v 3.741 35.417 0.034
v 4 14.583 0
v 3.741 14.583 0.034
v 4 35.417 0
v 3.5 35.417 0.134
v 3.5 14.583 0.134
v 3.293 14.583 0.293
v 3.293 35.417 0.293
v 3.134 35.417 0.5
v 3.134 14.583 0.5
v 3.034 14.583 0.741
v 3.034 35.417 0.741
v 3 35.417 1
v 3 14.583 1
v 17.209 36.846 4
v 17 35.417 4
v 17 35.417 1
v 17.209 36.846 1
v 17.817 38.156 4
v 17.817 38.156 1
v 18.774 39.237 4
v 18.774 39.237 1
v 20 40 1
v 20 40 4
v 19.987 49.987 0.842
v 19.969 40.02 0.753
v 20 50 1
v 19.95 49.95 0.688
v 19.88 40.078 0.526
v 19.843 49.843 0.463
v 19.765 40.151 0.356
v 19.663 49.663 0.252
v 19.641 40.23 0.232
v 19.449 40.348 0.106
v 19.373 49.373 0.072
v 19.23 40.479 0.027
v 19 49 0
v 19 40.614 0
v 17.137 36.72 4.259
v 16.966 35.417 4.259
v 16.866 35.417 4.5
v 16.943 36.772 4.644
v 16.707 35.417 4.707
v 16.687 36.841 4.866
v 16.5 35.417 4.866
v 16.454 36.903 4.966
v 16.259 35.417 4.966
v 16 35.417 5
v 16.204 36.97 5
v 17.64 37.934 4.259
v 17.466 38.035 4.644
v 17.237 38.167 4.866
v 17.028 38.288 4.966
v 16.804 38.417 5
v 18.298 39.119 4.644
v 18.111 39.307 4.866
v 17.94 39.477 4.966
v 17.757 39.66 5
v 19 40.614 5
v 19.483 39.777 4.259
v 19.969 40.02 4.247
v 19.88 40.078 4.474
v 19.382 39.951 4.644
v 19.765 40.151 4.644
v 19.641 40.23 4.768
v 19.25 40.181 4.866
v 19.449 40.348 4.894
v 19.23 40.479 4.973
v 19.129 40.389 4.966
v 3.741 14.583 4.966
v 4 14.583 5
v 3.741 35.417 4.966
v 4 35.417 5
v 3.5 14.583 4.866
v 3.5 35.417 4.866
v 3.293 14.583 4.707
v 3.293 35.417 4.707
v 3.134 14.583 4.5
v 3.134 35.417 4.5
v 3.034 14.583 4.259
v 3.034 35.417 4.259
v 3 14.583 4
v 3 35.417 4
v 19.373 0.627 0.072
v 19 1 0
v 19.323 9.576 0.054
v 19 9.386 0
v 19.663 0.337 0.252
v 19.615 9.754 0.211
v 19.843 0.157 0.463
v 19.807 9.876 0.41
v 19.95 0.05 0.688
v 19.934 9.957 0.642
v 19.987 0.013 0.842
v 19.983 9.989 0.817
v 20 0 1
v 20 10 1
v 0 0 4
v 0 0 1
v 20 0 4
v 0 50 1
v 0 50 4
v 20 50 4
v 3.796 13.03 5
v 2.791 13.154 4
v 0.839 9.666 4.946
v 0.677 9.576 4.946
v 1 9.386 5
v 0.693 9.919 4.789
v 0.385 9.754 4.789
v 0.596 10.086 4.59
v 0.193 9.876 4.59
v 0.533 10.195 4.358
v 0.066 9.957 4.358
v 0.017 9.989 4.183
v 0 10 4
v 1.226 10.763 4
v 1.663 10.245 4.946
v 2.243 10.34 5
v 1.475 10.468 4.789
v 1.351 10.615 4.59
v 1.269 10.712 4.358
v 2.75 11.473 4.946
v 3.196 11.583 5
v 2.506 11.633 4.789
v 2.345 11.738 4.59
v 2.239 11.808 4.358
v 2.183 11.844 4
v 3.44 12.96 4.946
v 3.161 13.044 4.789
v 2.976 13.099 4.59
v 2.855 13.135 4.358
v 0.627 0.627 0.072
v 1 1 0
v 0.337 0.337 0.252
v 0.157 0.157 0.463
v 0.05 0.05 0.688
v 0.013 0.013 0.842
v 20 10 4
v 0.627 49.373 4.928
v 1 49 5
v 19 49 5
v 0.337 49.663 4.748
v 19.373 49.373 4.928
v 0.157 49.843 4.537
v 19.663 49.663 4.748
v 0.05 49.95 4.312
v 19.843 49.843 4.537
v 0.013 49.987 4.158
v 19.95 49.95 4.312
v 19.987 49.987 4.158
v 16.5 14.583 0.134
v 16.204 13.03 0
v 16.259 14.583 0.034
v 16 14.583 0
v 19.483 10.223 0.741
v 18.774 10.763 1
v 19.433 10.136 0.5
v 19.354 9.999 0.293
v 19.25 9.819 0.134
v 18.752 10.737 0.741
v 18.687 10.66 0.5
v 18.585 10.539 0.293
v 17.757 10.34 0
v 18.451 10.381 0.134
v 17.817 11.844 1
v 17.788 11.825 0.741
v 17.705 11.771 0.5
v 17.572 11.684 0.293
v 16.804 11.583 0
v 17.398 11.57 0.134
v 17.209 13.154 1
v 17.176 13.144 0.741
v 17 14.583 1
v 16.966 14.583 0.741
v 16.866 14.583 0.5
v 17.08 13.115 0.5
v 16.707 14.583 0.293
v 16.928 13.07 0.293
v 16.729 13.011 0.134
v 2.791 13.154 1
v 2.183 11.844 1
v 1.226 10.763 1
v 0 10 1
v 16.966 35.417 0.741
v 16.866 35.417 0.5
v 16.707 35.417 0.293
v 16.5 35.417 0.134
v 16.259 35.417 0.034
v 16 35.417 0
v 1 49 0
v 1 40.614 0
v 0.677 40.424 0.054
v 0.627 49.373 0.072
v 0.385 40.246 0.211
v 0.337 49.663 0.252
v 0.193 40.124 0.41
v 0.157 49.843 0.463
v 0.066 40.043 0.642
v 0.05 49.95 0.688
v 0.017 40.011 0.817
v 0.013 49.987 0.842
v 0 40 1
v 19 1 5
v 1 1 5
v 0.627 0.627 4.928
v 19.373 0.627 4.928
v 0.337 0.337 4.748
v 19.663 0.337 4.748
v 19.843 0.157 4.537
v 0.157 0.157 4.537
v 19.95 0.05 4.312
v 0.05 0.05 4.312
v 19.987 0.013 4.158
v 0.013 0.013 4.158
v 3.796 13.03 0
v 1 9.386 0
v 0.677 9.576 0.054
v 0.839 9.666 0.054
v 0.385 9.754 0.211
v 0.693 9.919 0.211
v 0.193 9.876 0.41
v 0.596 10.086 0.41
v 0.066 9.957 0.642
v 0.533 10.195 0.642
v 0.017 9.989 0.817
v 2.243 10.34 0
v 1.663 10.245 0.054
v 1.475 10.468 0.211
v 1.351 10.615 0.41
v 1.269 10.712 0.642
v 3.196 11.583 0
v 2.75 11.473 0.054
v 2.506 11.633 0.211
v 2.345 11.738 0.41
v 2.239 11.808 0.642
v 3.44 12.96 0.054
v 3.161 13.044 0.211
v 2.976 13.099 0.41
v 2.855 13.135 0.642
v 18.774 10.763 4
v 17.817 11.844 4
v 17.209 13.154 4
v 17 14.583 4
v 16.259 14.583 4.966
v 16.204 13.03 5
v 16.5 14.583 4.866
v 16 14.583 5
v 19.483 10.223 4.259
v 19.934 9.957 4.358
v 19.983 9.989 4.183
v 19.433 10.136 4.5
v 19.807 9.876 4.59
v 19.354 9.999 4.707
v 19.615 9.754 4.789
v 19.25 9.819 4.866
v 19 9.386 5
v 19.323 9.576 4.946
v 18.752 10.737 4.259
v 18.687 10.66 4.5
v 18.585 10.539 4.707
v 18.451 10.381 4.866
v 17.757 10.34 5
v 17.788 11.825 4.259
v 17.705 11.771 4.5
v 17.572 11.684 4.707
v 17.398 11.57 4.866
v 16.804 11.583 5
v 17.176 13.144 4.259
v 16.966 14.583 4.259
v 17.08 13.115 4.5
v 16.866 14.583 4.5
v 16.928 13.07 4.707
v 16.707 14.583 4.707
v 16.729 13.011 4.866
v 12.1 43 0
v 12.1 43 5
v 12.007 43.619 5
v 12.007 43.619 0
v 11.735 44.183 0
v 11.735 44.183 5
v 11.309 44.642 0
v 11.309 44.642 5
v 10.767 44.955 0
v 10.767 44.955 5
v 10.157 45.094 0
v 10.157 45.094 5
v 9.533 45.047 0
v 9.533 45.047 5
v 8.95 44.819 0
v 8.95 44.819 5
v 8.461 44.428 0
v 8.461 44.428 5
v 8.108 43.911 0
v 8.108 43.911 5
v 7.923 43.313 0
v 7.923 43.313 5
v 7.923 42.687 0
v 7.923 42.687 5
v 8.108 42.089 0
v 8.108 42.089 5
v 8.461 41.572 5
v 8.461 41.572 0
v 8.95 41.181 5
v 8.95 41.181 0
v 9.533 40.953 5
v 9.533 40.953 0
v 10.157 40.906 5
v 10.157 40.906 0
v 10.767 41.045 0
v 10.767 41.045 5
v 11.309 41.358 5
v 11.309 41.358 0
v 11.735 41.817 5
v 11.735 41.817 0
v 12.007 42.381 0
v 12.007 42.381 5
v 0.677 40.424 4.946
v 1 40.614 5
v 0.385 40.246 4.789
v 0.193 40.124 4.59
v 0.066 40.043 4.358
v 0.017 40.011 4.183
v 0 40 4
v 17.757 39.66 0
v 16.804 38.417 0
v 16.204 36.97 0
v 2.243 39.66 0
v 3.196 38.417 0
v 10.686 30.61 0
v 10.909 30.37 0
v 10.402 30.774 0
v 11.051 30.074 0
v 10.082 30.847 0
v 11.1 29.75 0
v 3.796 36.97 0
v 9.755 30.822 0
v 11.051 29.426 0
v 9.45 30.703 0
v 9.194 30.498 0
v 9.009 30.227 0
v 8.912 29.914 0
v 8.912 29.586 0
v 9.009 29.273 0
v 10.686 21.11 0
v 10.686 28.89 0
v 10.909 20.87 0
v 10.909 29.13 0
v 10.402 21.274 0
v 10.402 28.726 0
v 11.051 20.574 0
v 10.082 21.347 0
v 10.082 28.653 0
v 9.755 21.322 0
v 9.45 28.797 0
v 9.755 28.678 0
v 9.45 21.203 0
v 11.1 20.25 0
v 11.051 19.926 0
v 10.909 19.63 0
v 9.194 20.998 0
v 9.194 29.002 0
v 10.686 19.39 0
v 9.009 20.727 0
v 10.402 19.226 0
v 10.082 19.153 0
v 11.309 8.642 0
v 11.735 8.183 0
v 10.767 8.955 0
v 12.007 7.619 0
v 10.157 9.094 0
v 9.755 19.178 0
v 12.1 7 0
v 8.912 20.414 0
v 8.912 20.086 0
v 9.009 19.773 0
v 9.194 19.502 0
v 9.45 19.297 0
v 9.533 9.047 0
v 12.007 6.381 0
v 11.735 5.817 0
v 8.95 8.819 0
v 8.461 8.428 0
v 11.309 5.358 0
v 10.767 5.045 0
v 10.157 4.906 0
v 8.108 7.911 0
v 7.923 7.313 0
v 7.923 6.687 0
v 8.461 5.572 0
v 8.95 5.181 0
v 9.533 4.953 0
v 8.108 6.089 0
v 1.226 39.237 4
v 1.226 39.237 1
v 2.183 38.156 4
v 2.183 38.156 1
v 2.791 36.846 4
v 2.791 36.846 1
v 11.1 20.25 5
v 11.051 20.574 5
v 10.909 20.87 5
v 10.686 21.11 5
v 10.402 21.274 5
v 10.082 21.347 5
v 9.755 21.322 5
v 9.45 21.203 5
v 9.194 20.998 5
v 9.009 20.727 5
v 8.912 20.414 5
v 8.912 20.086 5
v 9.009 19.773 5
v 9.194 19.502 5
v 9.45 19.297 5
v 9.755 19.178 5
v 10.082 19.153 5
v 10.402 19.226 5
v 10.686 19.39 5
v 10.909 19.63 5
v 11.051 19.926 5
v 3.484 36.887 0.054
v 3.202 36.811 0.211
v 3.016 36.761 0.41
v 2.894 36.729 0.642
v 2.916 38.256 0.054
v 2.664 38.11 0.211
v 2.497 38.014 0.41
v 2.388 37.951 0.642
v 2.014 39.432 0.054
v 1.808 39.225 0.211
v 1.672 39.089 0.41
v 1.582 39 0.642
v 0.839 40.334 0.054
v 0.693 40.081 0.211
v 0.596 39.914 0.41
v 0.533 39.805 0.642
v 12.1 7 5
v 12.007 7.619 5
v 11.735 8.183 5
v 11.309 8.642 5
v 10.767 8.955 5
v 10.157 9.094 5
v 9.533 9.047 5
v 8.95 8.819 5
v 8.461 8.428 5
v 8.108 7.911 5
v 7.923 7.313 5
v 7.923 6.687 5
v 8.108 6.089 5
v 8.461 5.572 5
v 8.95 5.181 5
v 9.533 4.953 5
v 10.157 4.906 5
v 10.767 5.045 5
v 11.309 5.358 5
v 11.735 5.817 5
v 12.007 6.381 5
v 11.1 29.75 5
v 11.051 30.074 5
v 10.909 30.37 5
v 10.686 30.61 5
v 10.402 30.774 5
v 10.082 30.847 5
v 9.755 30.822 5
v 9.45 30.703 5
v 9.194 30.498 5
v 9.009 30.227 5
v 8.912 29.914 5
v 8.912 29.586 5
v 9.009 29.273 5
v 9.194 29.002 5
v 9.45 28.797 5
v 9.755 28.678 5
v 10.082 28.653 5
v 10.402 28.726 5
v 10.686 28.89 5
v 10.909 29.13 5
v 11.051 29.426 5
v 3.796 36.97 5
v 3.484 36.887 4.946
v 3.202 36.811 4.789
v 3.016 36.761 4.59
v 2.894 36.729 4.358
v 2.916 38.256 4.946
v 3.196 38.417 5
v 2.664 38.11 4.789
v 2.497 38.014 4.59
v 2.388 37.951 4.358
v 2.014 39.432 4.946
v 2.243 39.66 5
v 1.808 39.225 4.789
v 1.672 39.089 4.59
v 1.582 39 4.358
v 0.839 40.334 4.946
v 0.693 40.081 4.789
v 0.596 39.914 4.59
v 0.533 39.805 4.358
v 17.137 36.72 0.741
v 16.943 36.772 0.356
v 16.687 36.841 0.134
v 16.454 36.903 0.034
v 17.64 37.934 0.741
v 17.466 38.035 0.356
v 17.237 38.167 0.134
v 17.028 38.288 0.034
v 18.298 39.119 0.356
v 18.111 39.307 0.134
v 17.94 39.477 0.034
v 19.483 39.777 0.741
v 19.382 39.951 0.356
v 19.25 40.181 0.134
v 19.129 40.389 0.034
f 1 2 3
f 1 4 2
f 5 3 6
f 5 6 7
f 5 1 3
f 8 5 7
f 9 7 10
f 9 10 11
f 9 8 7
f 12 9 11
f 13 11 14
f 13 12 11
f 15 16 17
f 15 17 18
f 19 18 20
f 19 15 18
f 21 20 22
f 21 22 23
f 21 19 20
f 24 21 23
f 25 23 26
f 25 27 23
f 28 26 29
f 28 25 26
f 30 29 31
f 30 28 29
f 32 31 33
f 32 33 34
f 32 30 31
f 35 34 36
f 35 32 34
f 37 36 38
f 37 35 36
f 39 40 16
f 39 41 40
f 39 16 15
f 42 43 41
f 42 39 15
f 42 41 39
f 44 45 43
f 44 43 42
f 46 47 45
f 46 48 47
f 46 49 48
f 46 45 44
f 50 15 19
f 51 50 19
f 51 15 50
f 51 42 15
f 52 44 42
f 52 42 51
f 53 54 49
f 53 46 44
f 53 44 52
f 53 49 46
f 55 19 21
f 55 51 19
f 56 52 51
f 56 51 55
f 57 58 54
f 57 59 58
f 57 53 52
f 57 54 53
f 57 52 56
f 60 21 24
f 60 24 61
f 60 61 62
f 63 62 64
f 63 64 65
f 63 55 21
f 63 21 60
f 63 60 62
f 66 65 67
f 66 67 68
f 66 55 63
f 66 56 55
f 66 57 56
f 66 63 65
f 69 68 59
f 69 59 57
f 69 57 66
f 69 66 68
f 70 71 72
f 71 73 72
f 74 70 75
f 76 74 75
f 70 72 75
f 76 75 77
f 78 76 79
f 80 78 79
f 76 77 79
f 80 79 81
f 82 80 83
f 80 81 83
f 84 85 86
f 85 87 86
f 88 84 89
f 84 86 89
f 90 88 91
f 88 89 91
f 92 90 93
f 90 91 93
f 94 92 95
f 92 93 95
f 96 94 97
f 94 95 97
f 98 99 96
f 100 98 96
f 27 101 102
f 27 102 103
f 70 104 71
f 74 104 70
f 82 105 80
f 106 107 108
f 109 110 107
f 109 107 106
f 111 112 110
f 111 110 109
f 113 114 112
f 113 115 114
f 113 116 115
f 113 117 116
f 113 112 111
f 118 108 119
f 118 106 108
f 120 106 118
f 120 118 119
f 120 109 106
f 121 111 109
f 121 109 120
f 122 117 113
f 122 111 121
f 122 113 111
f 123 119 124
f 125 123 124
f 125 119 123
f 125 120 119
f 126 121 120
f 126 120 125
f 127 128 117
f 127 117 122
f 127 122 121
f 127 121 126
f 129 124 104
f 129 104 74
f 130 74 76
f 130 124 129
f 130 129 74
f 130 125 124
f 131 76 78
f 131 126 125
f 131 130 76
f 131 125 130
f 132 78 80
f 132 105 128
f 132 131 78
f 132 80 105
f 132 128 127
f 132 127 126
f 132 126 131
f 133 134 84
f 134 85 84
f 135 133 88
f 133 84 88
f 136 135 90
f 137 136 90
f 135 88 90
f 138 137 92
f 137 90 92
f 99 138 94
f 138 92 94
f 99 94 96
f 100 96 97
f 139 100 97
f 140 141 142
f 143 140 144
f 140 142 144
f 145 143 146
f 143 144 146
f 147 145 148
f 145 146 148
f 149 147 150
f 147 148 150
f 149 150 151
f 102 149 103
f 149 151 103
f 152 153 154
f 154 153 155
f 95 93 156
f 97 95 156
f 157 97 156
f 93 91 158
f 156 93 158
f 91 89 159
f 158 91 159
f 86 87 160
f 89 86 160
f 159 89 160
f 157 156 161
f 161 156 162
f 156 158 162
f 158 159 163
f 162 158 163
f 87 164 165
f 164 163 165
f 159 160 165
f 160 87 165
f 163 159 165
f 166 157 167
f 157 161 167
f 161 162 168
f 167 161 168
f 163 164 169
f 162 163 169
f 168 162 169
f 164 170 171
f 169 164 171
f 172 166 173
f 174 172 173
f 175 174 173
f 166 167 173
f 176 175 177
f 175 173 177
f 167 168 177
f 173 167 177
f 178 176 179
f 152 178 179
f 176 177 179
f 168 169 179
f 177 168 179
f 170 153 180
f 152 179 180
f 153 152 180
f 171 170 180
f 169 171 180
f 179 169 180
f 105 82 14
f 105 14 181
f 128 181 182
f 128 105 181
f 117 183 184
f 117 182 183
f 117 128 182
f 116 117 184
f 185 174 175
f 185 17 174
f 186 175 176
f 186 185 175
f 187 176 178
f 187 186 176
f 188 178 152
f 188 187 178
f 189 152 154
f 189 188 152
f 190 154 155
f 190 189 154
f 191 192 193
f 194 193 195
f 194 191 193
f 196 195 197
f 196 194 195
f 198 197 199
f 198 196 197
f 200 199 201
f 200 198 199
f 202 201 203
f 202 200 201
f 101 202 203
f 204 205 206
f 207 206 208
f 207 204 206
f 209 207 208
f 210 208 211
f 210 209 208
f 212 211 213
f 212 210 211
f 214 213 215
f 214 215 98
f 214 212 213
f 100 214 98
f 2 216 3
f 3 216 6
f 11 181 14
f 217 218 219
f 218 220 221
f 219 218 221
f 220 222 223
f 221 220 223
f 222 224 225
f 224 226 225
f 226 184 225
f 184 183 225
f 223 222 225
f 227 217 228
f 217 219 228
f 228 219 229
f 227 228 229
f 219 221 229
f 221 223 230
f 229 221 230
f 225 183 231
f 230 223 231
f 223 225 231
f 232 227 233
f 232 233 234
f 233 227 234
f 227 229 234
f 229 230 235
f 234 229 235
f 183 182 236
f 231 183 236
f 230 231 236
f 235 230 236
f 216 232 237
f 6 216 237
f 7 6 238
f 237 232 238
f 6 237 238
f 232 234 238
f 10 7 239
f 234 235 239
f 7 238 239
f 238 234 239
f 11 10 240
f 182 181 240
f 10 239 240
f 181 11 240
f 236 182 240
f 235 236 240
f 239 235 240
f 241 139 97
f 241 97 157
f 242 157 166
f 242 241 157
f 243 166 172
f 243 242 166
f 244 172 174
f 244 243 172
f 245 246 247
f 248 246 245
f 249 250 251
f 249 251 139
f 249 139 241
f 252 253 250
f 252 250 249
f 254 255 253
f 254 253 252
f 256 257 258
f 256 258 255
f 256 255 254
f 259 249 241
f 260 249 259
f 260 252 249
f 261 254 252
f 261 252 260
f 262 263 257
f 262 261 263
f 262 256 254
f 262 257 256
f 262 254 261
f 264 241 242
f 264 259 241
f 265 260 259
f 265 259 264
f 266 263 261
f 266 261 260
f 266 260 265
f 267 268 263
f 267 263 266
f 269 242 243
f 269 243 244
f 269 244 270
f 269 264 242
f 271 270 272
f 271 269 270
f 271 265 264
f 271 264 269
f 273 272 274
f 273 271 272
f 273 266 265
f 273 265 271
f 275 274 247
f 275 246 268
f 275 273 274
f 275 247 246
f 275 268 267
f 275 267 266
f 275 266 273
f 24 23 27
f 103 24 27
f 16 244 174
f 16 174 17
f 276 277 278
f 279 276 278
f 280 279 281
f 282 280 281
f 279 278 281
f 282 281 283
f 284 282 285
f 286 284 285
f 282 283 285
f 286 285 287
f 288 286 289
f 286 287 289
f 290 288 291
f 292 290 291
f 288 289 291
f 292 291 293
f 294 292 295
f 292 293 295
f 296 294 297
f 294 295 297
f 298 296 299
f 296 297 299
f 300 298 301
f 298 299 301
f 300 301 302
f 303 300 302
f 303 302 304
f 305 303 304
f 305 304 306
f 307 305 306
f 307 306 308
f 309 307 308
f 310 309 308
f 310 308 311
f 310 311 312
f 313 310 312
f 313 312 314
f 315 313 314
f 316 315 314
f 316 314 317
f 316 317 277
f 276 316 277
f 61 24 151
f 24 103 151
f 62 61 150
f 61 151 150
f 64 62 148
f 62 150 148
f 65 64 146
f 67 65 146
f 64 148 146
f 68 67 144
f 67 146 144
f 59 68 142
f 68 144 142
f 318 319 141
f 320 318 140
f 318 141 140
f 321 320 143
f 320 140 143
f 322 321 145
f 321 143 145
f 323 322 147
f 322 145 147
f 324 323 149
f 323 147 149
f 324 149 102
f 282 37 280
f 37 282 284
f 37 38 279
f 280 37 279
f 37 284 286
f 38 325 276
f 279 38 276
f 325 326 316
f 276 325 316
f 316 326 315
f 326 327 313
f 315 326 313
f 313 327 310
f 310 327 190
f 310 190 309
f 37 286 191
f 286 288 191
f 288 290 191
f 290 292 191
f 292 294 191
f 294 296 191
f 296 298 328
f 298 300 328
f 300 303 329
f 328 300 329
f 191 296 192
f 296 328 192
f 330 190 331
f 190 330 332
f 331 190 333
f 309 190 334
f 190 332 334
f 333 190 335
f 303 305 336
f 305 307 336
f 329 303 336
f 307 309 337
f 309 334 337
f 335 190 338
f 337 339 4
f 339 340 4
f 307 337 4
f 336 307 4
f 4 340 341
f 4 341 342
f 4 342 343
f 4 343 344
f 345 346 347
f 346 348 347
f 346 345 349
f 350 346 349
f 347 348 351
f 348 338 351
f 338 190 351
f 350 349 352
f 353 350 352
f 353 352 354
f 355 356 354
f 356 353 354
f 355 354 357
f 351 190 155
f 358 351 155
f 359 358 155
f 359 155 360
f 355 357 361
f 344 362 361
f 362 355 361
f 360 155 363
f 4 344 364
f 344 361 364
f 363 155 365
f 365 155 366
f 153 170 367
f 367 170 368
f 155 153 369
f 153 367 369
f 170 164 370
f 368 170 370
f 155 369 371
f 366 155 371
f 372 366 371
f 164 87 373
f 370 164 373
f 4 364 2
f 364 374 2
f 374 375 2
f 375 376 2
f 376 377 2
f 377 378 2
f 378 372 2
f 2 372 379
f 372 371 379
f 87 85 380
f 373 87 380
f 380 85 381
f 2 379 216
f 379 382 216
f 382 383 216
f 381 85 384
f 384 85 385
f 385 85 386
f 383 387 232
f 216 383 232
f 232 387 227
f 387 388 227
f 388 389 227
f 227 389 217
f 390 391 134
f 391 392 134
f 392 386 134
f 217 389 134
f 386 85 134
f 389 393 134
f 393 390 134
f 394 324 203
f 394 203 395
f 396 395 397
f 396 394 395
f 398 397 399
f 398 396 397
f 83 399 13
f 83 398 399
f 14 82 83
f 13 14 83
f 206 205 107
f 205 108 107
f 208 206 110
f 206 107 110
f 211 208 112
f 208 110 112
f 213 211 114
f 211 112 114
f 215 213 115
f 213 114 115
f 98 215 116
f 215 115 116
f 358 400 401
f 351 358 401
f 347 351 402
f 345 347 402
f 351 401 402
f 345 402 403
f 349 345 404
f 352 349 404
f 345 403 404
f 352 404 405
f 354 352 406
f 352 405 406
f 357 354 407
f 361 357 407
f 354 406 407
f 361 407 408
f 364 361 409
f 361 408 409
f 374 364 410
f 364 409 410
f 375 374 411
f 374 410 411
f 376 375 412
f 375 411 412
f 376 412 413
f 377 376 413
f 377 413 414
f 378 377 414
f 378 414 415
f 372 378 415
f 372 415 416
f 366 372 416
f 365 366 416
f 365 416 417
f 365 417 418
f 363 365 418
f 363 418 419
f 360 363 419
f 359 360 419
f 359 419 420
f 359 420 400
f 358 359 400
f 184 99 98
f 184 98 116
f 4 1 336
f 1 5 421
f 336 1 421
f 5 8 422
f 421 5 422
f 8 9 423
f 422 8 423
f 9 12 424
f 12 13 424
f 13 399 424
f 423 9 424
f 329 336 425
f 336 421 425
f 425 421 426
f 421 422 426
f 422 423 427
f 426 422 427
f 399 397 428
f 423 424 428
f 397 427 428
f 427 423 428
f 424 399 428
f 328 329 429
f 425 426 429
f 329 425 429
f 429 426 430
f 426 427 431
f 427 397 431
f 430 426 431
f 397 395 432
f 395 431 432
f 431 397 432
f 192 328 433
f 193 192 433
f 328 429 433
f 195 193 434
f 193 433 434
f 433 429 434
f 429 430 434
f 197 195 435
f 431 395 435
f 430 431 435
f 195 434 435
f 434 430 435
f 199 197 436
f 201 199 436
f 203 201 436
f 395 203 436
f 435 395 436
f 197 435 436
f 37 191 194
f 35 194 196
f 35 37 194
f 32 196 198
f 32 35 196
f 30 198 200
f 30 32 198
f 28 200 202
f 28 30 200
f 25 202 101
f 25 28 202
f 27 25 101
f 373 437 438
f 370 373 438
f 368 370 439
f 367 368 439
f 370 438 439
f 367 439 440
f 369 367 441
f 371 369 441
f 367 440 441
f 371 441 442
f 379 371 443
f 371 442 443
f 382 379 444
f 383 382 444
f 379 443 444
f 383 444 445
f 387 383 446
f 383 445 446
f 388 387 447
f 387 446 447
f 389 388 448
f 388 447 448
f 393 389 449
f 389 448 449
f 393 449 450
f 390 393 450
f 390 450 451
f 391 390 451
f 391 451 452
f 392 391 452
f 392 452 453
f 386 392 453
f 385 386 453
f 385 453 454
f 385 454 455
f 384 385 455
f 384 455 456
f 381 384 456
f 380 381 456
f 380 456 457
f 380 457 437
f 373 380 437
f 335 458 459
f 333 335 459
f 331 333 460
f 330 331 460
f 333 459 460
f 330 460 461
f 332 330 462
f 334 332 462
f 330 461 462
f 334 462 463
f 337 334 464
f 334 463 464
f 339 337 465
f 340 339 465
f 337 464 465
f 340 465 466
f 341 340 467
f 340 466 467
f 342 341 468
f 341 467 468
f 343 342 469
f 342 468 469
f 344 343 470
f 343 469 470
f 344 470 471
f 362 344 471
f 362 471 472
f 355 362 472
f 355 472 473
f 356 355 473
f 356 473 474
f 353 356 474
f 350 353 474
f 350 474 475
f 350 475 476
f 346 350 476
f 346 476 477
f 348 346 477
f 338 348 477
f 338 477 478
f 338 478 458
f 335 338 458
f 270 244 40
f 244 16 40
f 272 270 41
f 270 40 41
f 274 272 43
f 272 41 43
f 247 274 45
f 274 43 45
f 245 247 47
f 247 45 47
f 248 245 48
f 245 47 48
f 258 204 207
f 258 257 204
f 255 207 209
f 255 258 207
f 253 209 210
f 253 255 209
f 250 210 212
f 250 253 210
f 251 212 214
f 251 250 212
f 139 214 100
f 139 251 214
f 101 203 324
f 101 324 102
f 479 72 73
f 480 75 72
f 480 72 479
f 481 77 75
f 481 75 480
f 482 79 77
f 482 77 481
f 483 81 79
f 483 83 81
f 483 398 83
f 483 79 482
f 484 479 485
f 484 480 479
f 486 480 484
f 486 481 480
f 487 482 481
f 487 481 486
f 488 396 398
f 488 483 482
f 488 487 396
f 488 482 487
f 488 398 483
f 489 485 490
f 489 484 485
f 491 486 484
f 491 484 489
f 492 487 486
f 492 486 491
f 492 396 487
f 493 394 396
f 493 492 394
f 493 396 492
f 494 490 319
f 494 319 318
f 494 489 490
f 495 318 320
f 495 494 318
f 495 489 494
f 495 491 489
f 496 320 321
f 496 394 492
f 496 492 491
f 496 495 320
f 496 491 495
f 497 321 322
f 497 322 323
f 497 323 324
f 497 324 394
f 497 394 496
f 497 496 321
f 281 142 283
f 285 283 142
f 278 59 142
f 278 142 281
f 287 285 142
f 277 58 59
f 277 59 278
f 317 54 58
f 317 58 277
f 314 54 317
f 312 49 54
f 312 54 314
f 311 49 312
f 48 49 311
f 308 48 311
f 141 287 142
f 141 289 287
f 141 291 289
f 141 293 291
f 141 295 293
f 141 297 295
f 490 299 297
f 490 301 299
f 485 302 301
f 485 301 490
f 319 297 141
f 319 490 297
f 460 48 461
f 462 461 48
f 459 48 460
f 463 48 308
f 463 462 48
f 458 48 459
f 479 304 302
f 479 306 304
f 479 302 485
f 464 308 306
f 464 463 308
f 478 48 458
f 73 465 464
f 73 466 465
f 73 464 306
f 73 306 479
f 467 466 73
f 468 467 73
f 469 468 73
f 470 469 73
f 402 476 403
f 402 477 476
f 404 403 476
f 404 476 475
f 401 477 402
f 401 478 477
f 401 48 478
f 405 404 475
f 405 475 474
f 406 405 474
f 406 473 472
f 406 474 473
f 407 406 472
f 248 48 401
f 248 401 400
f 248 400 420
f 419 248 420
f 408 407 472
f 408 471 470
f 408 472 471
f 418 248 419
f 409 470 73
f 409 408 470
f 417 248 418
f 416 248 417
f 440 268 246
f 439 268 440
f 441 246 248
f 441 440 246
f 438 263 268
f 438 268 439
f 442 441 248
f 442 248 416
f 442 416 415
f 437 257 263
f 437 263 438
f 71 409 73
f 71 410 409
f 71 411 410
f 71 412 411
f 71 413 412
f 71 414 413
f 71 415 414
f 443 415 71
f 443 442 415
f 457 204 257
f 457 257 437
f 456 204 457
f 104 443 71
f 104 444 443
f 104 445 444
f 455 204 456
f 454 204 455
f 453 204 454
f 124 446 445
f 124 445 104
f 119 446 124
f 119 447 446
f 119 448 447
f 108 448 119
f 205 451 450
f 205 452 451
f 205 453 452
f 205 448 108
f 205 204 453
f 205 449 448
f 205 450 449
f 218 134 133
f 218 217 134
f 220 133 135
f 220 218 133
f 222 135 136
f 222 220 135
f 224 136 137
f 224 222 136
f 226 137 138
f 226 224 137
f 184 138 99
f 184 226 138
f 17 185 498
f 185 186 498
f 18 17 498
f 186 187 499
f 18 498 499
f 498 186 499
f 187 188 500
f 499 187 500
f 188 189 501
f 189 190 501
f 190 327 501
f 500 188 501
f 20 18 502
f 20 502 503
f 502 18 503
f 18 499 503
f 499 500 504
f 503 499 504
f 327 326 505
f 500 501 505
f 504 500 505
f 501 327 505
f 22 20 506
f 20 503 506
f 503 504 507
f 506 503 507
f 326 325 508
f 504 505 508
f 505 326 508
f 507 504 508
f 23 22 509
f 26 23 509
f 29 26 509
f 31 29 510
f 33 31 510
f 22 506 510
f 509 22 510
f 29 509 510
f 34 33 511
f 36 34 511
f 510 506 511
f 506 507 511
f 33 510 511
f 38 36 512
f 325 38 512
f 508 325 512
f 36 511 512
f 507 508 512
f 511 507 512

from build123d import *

# Parameters (mm, degrees)
SKETCH1_W            = 20
SKETCH1_H            = 50
BOSS_EXTRUDE1_DEPTH  = 5
SKETCH2_R            = 2.1
SKETCH2_R_2          = 1.1
CUT_EXTRUDE1_DEPTH   = 55.083269132
SKETCH3_W            = 3
SKETCH3_H            = 30
CUT_EXTRUDE2_DEPTH   = 55.083269132
FILLET1_R            = 5
FILLET1_OF_MIRROR1_R = 5
FILLET3_R            = 1


with BuildPart() as part:
    # Sketch1 → Boss-Extrude1 (new body)
    with BuildSketch(Plane.XY):
        with Locations((10, 25)):
            Rectangle(SKETCH1_W, SKETCH1_H)
    extrude(amount=BOSS_EXTRUDE1_DEPTH)

    # Sketch2 → Cut-Extrude1 (cut, through all)
    with BuildSketch(Plane.XY.offset(5)):
        with Locations((10, 43)):
            Circle(SKETCH2_R)
        with Locations((10, 7)):
            Circle(SKETCH2_R)
        with Locations((10, 29.75)):
            Circle(SKETCH2_R_2)
        with Locations((10, 20.25)):
            Circle(SKETCH2_R_2)
    extrude(amount=-CUT_EXTRUDE1_DEPTH, mode=Mode.SUBTRACT)

    # Sketch3 → Cut-Extrude2 (cut, through all)
    with BuildSketch(Plane.XY.offset(5)):
        with Locations((1.5, 25)):
            Rectangle(SKETCH3_W, SKETCH3_H)
    cut_extrude2 = extrude(amount=-CUT_EXTRUDE2_DEPTH, mode=Mode.SUBTRACT)

    # Fillet1
    # the kernel refuses this fillet: 5 mm, written as the material it adds along each edge
    with BuildSketch(Plane(origin=(3, 10, 5), x_dir=(-1, 0, 0), z_dir=(0, 0, -1))) as fillet1_piece_1:
        with BuildLine():
            CenterArc((5, 4.582575695), FILLET1_R, 180, 66.421821522)
            Line((0, 4.582575695), (-0.1, 4.582575695))
            Line((-0.1, 4.582575695), (-0.1, 0))
            Line((-0.1, 0), (0, -0.1))
            ThreePointArc((0, -0.1), (1.5, -0.1), (2.96, -0.091651514))
            Line((2.96, -0.091651514), (3, 0))
        make_face()
    extrude(amount=5)
    with BuildSketch(Plane(origin=(3, 40, 5), x_dir=(0, -1, 0), z_dir=(0, 0, -1))) as fillet1_piece_2:
        with BuildLine():
            CenterArc((4.582575695, 5), FILLET1_R, 203.578178478, 66.421821522)
            Line((0, 3), (-0.091651514, 2.96))
            ThreePointArc((-0.091651514, 2.96), (-0.1, 1.5), (-0.1, 0))
            Line((-0.1, 0), (0, -0.1))
            Line((0, -0.1), (4.582575695, -0.1))
            Line((4.582575695, -0.1), (4.582575695, 0))
        make_face()
    extrude(amount=5)

    # Mirror1: Cut-Extrude2 across plane
    add(cut_extrude2.mirror(Plane.ZY.offset(-10)), mode=Mode.SUBTRACT)

    # Fillet1 of Mirror1
    # the kernel refuses this fillet: 5 mm, written as the material it adds along each edge
    with BuildSketch(Plane(origin=(17, 10, 5), x_dir=(0, 1, 0), z_dir=(0, 0, -1))) as fillet1_of_mirror1_piece_1:
        with BuildLine():
            CenterArc((4.582575695, 5), FILLET1_OF_MIRROR1_R, 203.578178478, 66.421821522)
            Line((0, 3), (-0.091651514, 2.96))
            ThreePointArc((-0.091651514, 2.96), (-0.1, 1.5), (-0.1, 0))
            Line((-0.1, 0), (0, -0.1))
            Line((0, -0.1), (4.582575695, -0.1))
            Line((4.582575695, -0.1), (4.582575695, 0))
        make_face()
    extrude(amount=5)
    with BuildSketch(Plane(origin=(17, 40, 5), x_dir=(1, 0, 0), z_dir=(0, 0, -1))) as fillet1_of_mirror1_piece_2:
        with BuildLine():
            CenterArc((5, 4.582575695), FILLET1_OF_MIRROR1_R, 180, 66.421821522)
            Line((0, 4.582575695), (-0.1, 4.582575695))
            Line((-0.1, 4.582575695), (-0.1, 0))
            Line((-0.1, 0), (0, -0.1))
            ThreePointArc((0, -0.1), (1.5, -0.1), (2.96, -0.091651514))
            Line((2.96, -0.091651514), (3, 0))
        make_face()
    extrude(amount=5)

    # Fillet3
    fillet3_edges = [part.edges().sort_by_distance(p)[0] for p in [
        (20, 5, 5),
        (10, 50, 5),
        (0, 5, 0),
        (0, 5, 5),
        (0, 45, 5),
        (10, 50, 0),
        (3, 25, 5),
        (3, 25, 0),
        (20, 5, 0),
        (2.183300133, 11.843962907, 5),
        (2.183300133, 11.843962907, 0),
        (2.183300133, 38.156037093, 5),
        (2.183300133, 38.156037093, 0),
        (10, 0, 0),
        (0, 45, 0),
        (20, 45, 0),
        (20, 45, 5),
        (10, 0, 5),
        (17, 25, 5),
        (17, 25, 0),
        (17.816699867, 11.843962907, 5),
        (17.816699867, 11.843962907, 0),
        (17.816699867, 38.156037093, 5),
        (17.816699867, 38.156037093, 0),
    ]]
    fillet(fillet3_edges, radius=FILLET3_R)


solid = part.part
